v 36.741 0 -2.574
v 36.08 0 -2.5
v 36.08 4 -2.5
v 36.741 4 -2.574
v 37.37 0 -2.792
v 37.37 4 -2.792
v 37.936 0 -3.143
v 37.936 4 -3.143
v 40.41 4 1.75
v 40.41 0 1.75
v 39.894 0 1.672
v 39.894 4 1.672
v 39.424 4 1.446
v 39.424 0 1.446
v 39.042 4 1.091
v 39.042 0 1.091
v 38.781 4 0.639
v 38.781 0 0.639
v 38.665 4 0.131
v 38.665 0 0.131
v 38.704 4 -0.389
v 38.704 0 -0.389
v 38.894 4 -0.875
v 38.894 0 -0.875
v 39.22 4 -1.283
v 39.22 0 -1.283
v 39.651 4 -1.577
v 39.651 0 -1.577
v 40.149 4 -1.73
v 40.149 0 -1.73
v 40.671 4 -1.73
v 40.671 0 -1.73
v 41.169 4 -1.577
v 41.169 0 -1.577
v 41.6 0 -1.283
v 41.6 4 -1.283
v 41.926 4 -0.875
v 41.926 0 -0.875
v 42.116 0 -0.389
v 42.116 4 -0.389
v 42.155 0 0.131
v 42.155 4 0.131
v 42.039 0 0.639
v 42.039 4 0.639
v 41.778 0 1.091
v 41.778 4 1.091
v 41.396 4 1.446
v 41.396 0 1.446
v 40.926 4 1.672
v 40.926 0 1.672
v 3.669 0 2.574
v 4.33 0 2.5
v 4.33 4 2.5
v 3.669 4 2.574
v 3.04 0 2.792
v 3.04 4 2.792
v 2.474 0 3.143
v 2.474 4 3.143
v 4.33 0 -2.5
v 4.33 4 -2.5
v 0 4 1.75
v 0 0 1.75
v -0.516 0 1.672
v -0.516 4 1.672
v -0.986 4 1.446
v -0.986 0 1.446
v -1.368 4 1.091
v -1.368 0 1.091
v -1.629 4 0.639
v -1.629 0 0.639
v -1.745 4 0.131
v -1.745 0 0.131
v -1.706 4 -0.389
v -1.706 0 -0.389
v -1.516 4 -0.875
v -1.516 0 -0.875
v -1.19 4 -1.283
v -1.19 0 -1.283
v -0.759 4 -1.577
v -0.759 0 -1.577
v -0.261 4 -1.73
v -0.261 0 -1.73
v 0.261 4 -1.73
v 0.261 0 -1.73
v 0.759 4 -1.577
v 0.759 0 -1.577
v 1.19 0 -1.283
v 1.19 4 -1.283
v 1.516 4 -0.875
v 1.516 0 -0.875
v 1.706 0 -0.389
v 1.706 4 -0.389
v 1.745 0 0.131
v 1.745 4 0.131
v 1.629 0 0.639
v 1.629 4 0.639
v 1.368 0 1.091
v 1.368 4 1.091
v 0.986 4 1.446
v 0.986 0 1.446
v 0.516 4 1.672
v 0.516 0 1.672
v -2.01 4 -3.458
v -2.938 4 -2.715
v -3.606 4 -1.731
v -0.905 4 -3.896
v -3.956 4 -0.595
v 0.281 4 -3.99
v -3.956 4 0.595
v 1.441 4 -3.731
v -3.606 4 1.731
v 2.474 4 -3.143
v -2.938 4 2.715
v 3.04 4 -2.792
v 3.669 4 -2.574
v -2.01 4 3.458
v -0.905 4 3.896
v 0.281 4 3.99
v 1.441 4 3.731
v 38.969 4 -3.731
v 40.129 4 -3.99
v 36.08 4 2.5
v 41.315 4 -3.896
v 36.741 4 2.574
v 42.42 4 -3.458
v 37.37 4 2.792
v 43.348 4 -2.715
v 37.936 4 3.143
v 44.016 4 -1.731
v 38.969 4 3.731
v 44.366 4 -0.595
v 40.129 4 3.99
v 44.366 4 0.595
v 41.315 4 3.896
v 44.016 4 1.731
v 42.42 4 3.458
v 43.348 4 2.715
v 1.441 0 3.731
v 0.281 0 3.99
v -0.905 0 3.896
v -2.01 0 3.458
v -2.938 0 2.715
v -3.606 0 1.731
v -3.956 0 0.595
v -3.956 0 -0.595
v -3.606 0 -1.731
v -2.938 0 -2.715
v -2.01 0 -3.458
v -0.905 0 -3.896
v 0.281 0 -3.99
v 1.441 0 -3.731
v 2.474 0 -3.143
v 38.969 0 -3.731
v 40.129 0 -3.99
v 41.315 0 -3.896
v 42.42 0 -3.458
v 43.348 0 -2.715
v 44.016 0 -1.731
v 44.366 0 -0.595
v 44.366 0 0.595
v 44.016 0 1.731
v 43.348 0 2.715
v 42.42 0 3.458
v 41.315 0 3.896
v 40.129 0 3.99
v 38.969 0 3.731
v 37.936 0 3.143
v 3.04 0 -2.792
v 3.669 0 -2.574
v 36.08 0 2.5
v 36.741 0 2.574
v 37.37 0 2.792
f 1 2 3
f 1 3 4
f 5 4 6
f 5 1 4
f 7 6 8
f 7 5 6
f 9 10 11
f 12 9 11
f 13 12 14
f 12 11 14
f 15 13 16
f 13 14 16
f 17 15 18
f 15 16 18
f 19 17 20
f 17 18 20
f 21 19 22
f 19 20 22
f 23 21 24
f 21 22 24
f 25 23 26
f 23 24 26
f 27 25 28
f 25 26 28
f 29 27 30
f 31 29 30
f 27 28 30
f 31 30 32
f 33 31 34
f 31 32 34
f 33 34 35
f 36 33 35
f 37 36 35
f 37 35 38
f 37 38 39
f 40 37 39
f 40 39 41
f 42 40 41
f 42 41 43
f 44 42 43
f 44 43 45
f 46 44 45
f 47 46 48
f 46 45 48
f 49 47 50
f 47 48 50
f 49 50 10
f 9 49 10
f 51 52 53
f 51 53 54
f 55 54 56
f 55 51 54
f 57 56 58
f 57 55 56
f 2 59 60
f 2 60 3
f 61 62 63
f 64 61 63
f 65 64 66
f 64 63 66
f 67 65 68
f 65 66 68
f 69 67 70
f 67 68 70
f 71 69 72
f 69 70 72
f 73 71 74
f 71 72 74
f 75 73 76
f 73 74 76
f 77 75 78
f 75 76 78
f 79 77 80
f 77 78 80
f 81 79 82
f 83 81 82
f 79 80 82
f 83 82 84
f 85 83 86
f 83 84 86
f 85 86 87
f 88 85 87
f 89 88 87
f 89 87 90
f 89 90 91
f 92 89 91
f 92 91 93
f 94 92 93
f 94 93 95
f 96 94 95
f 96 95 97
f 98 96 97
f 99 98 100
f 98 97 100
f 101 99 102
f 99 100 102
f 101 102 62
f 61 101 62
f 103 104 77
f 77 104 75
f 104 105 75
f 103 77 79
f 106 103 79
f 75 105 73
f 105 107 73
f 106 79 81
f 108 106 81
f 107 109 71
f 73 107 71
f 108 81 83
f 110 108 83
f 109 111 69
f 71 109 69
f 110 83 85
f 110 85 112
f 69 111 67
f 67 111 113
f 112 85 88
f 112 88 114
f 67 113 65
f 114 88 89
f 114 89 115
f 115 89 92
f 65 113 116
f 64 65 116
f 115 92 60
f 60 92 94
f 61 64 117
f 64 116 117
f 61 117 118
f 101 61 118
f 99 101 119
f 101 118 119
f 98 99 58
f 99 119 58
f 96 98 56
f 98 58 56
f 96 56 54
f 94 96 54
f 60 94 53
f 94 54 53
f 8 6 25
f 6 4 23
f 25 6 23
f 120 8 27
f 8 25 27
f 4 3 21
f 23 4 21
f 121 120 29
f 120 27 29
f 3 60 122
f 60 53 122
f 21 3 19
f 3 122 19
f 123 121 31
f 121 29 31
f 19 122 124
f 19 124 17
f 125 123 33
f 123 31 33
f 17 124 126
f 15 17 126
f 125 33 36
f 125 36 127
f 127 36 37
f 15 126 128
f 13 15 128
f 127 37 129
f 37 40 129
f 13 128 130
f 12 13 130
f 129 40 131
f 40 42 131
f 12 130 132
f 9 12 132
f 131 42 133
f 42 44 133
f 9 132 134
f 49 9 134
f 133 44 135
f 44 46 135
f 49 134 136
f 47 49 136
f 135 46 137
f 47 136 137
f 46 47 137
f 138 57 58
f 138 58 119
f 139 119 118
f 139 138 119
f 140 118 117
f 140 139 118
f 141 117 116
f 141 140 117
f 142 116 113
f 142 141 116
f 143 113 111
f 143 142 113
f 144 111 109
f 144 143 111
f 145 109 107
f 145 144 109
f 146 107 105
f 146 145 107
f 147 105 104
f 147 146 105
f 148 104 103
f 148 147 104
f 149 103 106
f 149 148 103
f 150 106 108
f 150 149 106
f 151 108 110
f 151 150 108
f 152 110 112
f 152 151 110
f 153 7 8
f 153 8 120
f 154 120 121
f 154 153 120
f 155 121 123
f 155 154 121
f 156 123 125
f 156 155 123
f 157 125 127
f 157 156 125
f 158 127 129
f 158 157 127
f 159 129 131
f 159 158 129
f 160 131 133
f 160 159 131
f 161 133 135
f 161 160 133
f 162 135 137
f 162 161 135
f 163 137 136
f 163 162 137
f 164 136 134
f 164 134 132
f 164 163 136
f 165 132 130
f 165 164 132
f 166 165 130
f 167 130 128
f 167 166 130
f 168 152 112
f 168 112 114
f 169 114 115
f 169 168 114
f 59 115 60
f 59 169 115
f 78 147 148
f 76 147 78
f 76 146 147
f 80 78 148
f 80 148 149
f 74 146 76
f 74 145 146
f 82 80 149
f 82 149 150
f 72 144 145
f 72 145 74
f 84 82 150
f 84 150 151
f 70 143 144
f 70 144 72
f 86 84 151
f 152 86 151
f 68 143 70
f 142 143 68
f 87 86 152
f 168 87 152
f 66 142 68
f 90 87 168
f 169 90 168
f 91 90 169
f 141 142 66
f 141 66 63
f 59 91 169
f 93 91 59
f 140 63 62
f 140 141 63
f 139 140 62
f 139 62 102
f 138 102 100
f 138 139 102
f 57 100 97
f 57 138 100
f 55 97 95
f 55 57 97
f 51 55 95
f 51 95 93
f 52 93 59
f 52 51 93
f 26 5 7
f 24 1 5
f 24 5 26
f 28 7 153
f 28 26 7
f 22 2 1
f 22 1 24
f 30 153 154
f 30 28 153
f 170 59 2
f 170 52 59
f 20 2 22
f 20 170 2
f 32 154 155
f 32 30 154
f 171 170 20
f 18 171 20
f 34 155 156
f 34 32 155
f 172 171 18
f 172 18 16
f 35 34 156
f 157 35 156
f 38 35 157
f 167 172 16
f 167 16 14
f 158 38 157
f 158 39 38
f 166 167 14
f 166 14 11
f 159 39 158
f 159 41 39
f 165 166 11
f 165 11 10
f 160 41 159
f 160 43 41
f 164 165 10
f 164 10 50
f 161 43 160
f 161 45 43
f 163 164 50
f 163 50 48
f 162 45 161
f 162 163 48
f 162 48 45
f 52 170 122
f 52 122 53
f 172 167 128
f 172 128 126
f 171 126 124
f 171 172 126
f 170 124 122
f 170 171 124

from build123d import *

# Parameters (mm, degrees)
SKETCH1_R           = 1.75
BOSS_EXTRUDE1_DEPTH = 4


with BuildPart() as part:
    # Sketch1 → Boss-Extrude1 (new body)
    with BuildSketch(Plane.XZ):
        with BuildLine():
            Line((36.07987298, 2.5), (4.330127019, 2.5))
            ThreePointArc((4.330127019, 2.5), (3.348146513, 2.665266452), (2.474358297, 3.142857143))
            ThreePointArc((2.474358297, 3.142857143), (-4, 0), (2.474358297, -3.142857143))
            ThreePointArc((2.474358297, -3.142857143), (3.348146513, -2.665266452), (4.330127019, -2.5))
            Line((4.330127019, -2.5), (36.07987298, -2.5))
            ThreePointArc((36.07987298, -2.5), (37.061853486, -2.665266452), (37.935641702, -3.142857143))
            ThreePointArc((37.935641702, -3.142857143), (44.409999999, 0), (37.935641702, 3.142857143))
            ThreePointArc((37.935641702, 3.142857143), (37.061853486, 2.665266452), (36.07987298, 2.5))
        make_face()
        with Locations(Location((40.409999999, 0, 0), (0, 0, 90))):
            Circle(SKETCH1_R, mode=Mode.SUBTRACT)
        with Locations(Location((0, 0, 0), (0, 0, 90))):
            Circle(SKETCH1_R, mode=Mode.SUBTRACT)
    extrude(amount=-BOSS_EXTRUDE1_DEPTH)


solid = part.part
